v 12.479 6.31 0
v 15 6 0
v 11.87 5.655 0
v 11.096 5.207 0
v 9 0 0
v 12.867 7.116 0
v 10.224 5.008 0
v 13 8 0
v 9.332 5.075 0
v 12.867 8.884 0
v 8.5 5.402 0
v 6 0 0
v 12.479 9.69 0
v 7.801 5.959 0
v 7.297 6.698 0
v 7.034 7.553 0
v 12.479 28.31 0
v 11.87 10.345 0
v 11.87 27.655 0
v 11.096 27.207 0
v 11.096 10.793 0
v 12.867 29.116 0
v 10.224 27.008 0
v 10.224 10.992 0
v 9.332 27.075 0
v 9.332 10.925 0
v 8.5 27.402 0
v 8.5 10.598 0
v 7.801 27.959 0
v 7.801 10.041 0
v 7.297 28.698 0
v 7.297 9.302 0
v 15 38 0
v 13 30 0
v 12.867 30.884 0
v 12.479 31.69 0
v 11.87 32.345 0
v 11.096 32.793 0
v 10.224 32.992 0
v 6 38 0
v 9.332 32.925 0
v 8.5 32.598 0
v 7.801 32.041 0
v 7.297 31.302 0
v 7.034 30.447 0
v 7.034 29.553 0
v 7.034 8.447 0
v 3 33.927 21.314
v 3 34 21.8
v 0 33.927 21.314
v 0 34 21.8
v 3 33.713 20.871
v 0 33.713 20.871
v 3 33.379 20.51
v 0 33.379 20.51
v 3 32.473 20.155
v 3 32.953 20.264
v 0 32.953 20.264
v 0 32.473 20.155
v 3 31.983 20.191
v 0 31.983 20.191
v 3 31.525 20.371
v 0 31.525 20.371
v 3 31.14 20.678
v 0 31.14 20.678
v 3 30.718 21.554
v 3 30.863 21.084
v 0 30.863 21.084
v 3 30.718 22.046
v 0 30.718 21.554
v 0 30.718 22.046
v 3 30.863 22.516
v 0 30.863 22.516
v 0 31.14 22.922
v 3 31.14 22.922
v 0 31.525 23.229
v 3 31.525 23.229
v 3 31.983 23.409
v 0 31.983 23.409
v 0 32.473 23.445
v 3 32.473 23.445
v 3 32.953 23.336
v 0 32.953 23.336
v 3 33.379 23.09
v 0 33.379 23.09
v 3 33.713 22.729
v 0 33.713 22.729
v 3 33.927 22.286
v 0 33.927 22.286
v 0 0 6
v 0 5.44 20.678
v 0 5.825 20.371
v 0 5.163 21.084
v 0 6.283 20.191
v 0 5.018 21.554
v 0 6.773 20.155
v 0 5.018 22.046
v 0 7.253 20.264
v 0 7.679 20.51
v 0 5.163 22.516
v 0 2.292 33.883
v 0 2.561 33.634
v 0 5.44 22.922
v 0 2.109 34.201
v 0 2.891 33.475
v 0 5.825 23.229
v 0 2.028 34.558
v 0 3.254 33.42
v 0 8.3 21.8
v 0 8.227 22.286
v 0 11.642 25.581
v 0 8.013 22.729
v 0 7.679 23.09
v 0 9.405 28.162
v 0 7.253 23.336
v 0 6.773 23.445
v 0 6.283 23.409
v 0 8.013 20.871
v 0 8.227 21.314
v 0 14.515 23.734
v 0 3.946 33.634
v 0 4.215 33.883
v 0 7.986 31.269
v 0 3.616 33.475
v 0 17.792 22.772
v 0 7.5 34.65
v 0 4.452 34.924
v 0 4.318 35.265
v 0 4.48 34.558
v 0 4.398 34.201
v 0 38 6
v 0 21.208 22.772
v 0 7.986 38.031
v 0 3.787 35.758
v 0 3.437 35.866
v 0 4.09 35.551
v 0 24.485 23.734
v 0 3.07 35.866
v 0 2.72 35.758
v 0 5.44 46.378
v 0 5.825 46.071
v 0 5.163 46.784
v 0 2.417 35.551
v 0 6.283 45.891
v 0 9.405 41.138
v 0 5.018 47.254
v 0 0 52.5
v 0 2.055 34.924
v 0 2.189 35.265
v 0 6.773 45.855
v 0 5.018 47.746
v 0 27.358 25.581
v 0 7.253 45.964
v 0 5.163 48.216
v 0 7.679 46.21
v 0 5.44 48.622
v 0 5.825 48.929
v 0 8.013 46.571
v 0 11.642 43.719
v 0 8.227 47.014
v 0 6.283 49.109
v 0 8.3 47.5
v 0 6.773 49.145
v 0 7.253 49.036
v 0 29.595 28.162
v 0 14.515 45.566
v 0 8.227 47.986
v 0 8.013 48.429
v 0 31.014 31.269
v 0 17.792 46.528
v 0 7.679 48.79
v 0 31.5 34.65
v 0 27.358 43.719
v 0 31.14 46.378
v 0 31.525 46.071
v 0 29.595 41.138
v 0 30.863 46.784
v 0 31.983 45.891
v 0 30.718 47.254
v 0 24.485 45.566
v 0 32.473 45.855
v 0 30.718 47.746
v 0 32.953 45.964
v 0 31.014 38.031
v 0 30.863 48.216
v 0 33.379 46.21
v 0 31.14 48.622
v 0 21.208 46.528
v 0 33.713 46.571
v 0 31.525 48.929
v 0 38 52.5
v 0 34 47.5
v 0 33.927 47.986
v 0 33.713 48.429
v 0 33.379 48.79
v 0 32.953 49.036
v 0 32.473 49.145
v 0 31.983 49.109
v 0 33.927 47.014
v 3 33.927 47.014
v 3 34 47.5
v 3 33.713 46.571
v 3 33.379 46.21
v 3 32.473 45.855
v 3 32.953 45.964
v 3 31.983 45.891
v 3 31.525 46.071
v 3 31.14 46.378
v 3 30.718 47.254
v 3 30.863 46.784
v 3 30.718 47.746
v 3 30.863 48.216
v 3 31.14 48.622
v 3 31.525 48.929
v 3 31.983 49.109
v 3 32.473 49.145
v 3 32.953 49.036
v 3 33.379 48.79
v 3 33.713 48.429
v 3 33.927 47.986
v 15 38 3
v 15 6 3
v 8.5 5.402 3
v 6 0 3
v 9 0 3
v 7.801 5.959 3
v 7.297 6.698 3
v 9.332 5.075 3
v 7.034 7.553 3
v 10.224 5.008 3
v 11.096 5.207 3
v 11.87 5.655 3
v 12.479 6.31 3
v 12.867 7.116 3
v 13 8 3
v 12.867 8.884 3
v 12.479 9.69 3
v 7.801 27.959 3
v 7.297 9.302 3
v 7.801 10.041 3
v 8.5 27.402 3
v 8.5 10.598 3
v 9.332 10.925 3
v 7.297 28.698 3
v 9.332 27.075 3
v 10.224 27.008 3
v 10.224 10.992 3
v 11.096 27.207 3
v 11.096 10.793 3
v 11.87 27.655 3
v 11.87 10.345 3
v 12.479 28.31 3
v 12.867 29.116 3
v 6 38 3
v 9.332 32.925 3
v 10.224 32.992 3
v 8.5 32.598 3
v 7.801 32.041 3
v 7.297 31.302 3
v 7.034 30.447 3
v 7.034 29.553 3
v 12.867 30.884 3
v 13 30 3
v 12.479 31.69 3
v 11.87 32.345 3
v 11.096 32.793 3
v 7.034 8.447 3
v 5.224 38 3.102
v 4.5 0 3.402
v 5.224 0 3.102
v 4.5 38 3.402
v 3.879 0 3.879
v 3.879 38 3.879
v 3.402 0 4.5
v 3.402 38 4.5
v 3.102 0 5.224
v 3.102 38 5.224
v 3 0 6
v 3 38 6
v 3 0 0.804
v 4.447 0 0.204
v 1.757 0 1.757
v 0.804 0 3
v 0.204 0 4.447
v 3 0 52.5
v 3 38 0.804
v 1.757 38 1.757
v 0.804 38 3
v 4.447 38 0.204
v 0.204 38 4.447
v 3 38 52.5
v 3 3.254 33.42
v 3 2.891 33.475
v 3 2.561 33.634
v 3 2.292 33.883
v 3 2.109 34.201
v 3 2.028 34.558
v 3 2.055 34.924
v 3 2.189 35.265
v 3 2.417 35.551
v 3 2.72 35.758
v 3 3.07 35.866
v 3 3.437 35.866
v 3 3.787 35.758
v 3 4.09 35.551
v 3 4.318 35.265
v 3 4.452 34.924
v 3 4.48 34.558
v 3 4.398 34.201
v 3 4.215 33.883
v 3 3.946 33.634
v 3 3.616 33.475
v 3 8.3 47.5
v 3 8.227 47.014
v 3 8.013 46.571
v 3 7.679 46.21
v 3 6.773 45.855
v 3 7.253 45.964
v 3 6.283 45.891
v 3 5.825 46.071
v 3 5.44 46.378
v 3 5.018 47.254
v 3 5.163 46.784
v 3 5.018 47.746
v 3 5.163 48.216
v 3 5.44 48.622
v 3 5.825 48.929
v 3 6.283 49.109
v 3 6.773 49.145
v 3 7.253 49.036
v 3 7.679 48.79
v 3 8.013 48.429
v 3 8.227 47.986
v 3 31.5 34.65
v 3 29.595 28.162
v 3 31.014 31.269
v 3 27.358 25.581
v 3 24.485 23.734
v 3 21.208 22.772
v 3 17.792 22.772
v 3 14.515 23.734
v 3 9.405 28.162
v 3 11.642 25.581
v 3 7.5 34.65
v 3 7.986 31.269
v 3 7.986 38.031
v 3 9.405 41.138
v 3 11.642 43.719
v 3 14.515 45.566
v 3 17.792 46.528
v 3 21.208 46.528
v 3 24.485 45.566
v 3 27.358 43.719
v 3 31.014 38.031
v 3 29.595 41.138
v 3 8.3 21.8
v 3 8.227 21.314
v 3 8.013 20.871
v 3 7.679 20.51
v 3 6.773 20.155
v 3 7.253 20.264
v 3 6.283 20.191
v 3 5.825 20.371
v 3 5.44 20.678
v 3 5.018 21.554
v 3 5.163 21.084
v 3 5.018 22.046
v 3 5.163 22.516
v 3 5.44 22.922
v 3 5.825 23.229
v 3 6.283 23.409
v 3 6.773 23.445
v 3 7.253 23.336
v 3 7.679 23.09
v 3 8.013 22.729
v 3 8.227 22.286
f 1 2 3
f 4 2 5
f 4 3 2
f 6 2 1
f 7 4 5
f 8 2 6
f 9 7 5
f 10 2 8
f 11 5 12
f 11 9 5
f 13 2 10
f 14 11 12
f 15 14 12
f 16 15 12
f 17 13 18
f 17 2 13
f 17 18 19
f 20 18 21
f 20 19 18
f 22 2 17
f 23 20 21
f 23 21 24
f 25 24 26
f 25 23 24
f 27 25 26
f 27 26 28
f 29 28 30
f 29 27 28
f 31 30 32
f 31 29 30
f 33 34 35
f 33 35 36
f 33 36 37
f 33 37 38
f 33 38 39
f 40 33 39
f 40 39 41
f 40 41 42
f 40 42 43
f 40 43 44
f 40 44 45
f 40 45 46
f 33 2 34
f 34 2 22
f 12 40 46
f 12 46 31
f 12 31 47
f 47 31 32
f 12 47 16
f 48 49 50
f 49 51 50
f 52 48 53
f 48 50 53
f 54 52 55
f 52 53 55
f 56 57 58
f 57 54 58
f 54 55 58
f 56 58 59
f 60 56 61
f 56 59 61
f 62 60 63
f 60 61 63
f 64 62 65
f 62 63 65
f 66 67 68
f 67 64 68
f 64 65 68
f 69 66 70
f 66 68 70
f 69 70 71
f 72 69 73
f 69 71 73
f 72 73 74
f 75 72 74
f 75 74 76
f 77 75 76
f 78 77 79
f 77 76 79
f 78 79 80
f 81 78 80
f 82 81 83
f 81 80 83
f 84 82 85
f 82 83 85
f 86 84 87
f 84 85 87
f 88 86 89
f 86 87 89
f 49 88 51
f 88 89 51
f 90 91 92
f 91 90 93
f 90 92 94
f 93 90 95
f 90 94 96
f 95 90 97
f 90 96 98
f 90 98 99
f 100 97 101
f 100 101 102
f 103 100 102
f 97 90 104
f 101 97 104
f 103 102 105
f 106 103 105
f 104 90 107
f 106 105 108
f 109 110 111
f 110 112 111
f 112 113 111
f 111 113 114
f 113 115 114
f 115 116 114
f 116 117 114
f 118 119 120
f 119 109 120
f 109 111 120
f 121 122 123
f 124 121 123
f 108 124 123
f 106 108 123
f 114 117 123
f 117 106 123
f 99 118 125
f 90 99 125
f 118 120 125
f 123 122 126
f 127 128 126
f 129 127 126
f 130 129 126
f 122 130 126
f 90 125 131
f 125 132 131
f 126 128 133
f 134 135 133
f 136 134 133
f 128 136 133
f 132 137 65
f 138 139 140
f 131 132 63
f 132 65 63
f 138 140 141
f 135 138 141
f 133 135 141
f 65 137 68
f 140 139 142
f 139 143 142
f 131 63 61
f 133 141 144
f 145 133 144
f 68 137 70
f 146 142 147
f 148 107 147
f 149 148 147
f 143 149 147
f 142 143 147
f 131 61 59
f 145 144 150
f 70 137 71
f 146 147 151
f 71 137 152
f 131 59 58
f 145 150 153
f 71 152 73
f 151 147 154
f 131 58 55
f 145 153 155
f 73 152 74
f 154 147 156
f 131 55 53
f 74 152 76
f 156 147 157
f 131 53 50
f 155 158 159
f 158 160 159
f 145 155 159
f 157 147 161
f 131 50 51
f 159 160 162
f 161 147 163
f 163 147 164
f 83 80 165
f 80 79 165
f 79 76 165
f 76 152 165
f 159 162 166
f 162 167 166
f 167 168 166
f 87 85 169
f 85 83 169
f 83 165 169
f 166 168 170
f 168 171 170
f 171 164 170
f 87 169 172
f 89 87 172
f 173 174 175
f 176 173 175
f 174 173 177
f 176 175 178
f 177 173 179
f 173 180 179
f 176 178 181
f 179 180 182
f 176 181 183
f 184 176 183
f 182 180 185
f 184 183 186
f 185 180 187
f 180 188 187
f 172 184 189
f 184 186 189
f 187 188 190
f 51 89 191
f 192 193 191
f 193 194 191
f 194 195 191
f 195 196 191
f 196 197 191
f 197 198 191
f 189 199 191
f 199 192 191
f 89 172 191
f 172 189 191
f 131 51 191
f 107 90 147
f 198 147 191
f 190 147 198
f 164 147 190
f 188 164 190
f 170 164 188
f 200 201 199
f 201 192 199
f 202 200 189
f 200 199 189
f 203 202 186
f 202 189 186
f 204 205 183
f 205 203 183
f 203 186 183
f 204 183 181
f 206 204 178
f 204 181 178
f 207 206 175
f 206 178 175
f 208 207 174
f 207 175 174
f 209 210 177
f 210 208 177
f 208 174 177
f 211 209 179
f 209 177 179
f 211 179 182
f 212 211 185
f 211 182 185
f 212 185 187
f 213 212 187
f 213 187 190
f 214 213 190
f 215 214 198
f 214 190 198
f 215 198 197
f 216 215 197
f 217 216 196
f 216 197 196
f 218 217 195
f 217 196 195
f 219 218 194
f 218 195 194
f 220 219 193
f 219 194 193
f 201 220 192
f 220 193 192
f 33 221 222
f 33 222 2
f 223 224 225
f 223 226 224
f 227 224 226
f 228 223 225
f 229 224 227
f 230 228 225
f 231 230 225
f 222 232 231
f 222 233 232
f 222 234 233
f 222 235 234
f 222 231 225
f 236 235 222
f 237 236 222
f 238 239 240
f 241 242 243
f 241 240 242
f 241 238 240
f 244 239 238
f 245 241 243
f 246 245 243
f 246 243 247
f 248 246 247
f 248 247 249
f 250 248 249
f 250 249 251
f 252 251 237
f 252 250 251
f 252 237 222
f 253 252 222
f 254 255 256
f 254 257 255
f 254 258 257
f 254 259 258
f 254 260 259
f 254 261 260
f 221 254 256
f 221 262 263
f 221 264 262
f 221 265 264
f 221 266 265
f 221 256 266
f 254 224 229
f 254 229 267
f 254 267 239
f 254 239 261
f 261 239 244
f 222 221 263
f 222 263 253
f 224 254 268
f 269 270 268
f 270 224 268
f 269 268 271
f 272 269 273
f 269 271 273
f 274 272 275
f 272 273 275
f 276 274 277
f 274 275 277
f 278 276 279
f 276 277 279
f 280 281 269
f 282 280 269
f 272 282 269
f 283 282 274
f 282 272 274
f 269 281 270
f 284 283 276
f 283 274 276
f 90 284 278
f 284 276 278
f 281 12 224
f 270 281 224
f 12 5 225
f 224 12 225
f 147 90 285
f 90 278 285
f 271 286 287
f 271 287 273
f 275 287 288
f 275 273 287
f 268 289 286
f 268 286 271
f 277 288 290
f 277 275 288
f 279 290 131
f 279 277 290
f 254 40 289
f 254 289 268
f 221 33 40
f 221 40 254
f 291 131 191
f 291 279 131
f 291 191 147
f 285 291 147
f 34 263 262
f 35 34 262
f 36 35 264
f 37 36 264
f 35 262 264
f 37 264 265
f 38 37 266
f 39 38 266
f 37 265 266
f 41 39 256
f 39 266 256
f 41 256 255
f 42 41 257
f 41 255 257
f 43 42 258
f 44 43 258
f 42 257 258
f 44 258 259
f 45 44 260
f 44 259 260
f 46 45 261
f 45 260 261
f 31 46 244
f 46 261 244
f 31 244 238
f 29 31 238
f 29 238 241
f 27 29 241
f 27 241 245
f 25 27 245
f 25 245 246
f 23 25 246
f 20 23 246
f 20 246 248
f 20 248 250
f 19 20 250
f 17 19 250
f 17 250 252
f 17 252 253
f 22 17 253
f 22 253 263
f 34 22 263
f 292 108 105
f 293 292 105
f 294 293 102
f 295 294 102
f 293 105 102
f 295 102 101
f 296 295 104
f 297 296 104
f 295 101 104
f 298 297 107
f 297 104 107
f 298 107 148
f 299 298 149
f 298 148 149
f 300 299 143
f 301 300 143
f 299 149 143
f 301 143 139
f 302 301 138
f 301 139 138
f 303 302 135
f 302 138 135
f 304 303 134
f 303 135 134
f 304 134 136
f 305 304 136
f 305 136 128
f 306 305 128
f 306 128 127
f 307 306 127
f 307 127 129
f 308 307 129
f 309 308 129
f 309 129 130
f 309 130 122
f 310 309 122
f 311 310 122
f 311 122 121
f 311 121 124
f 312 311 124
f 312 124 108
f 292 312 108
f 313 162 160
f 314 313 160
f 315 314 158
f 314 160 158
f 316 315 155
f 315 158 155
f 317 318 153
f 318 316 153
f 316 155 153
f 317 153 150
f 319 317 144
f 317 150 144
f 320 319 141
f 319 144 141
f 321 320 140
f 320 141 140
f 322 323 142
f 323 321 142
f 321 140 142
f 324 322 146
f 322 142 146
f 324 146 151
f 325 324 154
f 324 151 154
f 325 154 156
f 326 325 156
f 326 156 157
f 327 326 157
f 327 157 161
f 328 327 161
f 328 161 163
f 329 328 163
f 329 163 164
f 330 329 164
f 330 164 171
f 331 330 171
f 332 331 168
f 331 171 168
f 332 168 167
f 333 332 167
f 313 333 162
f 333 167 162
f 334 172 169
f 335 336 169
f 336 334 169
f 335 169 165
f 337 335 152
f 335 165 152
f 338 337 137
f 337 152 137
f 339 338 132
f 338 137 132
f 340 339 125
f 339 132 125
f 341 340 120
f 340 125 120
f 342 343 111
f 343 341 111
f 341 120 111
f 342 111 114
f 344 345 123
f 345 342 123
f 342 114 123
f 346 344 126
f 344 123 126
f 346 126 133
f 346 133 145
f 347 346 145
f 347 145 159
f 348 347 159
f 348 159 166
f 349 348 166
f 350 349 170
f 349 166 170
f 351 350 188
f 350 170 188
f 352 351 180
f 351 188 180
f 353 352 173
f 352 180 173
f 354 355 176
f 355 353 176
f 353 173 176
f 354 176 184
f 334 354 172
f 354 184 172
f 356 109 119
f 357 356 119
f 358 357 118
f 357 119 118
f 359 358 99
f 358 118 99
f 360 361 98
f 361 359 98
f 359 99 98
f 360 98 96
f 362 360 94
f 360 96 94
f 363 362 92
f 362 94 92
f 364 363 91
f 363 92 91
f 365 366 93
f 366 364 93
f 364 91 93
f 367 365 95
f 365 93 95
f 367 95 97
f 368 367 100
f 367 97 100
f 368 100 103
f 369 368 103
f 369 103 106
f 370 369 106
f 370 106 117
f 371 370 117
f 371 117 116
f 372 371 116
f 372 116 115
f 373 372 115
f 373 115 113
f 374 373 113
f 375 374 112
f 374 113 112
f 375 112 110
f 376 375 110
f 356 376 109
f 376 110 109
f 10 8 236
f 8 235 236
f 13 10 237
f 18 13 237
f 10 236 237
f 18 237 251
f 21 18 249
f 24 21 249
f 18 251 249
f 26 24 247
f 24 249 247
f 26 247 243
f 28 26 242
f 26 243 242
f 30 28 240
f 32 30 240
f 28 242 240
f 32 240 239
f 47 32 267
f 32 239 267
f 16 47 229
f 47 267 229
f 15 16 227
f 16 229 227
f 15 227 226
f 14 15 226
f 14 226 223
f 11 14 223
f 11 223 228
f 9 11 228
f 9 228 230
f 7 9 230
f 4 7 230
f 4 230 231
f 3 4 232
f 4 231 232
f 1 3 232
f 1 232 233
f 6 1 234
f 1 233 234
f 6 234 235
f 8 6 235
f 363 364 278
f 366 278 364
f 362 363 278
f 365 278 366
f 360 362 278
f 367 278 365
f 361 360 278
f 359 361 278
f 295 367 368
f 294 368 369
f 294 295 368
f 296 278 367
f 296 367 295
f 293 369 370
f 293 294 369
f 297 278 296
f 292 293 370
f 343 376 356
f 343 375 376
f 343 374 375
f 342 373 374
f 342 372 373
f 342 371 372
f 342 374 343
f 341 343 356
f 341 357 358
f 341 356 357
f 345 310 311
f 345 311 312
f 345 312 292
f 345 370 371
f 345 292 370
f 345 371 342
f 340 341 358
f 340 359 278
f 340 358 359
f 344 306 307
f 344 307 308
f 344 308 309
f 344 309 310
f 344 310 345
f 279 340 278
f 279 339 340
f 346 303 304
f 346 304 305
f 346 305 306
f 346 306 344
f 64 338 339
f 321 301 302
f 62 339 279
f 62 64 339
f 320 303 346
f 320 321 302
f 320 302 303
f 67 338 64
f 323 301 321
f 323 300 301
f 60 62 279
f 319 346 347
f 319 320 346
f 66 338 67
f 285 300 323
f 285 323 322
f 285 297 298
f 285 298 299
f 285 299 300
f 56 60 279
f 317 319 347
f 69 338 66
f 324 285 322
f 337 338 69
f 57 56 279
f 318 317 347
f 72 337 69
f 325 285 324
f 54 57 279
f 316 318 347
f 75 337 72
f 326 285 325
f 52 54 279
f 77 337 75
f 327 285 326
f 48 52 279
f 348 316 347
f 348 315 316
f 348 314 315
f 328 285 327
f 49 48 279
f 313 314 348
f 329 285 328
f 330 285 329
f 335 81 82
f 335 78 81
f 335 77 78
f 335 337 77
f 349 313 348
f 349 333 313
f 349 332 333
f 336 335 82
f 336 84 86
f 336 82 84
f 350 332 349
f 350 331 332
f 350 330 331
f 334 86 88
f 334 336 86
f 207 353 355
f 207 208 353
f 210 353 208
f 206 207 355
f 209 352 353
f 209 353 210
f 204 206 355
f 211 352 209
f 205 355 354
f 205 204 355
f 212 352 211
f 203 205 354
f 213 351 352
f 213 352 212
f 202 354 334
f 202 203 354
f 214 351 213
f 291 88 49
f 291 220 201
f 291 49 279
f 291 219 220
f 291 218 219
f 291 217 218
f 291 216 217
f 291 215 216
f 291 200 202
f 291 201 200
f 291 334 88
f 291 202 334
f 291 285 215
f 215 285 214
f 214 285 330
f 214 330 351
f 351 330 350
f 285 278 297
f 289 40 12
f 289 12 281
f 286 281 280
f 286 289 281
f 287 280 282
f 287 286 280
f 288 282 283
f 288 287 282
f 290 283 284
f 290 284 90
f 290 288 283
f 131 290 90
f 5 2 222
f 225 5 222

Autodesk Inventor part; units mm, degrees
ref_plane "YZ Plane" through (0, 0, 0) normal (1, 0, 0) x (0, 1, 0)
ref_plane "XZ Plane" through (0, 0, 0) normal (0, 1, 0) x (-1, 0, 0)
ref_plane "XY Plane" through (0, 0, 0) normal (0, 0, 1) x (1, 0, 0)
sketch "Szkic1" plane through (0, 0, 0) normal (1, 0, 0) x (0, 1, 0)
  line L0 (0, 0) -> (38, 0)
  line L1 (38, 0) -> (38, 52.5)
  line L2 (38, 52.5) -> (0, 52.5)
  line L3 (0, 52.5) -> (0, 0)
  circle A0 centre (19.5, 34.65) radius 12
  circle A1 centre (6.65, 47.5) radius 1.65
  circle A2 centre (32.35, 47.5) radius 1.65
  circle A3 centre (6.65, 21.8) radius 1.65
  circle A4 centre (32.35, 21.8) radius 1.65
  dimension "d0" = 38
  dimension "d1" = 52.5
  dimension "d2" = 24
  dimension "d3" = 17.85
  dimension "d5" = 3.3
  dimension "d6" = 3.3
  dimension "d7" = 3.3
  dimension "d8" = 3.3
  dimension "d9" = 25.7
  dimension "d10" = 25.7
  dimension "d11" = 25.7
  dimension "d12" = 25.7
  dimension "d13" = 5
  dimension "d14" = 5
  dimension "d15" = 12.85
  dimension "d16" = 12.85
  dimension "d38" = 18.5
extrude "Płyta1" add sketch "Szkic1" along normal blind 3
sketch "Szkic2" plane through (0, 38, 3) normal (0, 0, -1) x (-1, 0, 0)
  line L0 (0, -38) -> (0, 0)
  line L1 (0, 0) -> (-15, 0)
  line L2 (-15, 0) -> (-15, -38)
  line L3 (-15, -38) -> (0, -38)
edge flange "Kołnierz1" height 15 angle 90 thickness 3 bend radius 3 thickness toward (0, 0, -1) relief tear relief width 3 relief depth 1.5 edges at (3, 19, 0) wall of the first edge with corners at (0, 0, 3) (0, 38, 3) (15, 38, 3) (15, 0, 3)
bend "Zagięcie1"
corner "Narożnik1"
sketch "Szkic3" plane through (15, 0, 3) normal (0, 0, 1) x (1, 0, 0)
  circle A0 centre (-5, 8) radius 3
  circle A1 centre (-5, 30) radius 3
  line L0 (-9, 38) -> (0, 38) projected
  line L1 (-9, 0) -> (0, 0) projected
  line L2 (0, 0) -> (0, 38) projected
  point P0 (-15, 0)
  dimension "d30" = 6
  dimension "d31" = 6
  dimension "d32" = 8
  dimension "d33" = 8
  dimension "d34" = 5
  dimension "d35" = 5
extrude "Wytnij1" cut sketch "Szkic3" against normal blind 3
chamfer "Fazowanie narożnika1" distance 6 angle 45 1 edges at (15, 0, 1.5)
sketch "Szkic4" plane through (3, 0, 0) normal (1, 0, 0) x (0, 0, -1)
  point P0 (-34.65, 3.2537)
hole "Otwór1" at (3, 3.2537, 34.65) direction (-1, 0, 0) diameter 2.459 depth 3.7451 tip angle 120 thread size "M3x0.5" class "6H" standard "ISO Metric profile"
equation "\"d36\" = Grubość"
equation "\"d19\" = Grubość"
equation "\"d20\" = SzerokośćGięciaPodcięcia"
equation "\"d21\" = GłębokośćGięciaPodcięcia"
equation "\"d22\" = MinimalnaPozostałość"
equation "\"d23\" = PromieńPrzejścia"
equation "\"d26\" = PromieńGięcia"
equation "\"d27\" = RozmiarPodcięciaNarożnika"
equation "\"d28\" = Wielk_odstępu"
equation "\"d29\" = Rozmiar_promienia_Jacobiego"
equation "\"PromieńGięcia\" = Grubość"
equation "\"SzerokośćGięciaPodcięcia\" = Grubość"
equation "\"GłębokośćGięciaPodcięcia\" = 0.5 * Grubość"
equation "\"RozmiarPodcięciaNarożnika\" = 4 * Grubość"
equation "\"MinimalnaPozostałość\" = 2 * Grubość"
equation "\"PromieńPrzejścia\" = PromieńGięcia"
equation "\"Rozmiar_promienia_Jacobiego\" = PromieńGięcia"
equation "\"Wielk_odstępu\" = Grubość"
equation "\"Grubość\" = 3"
properties part number "RR-PCSS-MSK" material "Stal nierdzewna"
